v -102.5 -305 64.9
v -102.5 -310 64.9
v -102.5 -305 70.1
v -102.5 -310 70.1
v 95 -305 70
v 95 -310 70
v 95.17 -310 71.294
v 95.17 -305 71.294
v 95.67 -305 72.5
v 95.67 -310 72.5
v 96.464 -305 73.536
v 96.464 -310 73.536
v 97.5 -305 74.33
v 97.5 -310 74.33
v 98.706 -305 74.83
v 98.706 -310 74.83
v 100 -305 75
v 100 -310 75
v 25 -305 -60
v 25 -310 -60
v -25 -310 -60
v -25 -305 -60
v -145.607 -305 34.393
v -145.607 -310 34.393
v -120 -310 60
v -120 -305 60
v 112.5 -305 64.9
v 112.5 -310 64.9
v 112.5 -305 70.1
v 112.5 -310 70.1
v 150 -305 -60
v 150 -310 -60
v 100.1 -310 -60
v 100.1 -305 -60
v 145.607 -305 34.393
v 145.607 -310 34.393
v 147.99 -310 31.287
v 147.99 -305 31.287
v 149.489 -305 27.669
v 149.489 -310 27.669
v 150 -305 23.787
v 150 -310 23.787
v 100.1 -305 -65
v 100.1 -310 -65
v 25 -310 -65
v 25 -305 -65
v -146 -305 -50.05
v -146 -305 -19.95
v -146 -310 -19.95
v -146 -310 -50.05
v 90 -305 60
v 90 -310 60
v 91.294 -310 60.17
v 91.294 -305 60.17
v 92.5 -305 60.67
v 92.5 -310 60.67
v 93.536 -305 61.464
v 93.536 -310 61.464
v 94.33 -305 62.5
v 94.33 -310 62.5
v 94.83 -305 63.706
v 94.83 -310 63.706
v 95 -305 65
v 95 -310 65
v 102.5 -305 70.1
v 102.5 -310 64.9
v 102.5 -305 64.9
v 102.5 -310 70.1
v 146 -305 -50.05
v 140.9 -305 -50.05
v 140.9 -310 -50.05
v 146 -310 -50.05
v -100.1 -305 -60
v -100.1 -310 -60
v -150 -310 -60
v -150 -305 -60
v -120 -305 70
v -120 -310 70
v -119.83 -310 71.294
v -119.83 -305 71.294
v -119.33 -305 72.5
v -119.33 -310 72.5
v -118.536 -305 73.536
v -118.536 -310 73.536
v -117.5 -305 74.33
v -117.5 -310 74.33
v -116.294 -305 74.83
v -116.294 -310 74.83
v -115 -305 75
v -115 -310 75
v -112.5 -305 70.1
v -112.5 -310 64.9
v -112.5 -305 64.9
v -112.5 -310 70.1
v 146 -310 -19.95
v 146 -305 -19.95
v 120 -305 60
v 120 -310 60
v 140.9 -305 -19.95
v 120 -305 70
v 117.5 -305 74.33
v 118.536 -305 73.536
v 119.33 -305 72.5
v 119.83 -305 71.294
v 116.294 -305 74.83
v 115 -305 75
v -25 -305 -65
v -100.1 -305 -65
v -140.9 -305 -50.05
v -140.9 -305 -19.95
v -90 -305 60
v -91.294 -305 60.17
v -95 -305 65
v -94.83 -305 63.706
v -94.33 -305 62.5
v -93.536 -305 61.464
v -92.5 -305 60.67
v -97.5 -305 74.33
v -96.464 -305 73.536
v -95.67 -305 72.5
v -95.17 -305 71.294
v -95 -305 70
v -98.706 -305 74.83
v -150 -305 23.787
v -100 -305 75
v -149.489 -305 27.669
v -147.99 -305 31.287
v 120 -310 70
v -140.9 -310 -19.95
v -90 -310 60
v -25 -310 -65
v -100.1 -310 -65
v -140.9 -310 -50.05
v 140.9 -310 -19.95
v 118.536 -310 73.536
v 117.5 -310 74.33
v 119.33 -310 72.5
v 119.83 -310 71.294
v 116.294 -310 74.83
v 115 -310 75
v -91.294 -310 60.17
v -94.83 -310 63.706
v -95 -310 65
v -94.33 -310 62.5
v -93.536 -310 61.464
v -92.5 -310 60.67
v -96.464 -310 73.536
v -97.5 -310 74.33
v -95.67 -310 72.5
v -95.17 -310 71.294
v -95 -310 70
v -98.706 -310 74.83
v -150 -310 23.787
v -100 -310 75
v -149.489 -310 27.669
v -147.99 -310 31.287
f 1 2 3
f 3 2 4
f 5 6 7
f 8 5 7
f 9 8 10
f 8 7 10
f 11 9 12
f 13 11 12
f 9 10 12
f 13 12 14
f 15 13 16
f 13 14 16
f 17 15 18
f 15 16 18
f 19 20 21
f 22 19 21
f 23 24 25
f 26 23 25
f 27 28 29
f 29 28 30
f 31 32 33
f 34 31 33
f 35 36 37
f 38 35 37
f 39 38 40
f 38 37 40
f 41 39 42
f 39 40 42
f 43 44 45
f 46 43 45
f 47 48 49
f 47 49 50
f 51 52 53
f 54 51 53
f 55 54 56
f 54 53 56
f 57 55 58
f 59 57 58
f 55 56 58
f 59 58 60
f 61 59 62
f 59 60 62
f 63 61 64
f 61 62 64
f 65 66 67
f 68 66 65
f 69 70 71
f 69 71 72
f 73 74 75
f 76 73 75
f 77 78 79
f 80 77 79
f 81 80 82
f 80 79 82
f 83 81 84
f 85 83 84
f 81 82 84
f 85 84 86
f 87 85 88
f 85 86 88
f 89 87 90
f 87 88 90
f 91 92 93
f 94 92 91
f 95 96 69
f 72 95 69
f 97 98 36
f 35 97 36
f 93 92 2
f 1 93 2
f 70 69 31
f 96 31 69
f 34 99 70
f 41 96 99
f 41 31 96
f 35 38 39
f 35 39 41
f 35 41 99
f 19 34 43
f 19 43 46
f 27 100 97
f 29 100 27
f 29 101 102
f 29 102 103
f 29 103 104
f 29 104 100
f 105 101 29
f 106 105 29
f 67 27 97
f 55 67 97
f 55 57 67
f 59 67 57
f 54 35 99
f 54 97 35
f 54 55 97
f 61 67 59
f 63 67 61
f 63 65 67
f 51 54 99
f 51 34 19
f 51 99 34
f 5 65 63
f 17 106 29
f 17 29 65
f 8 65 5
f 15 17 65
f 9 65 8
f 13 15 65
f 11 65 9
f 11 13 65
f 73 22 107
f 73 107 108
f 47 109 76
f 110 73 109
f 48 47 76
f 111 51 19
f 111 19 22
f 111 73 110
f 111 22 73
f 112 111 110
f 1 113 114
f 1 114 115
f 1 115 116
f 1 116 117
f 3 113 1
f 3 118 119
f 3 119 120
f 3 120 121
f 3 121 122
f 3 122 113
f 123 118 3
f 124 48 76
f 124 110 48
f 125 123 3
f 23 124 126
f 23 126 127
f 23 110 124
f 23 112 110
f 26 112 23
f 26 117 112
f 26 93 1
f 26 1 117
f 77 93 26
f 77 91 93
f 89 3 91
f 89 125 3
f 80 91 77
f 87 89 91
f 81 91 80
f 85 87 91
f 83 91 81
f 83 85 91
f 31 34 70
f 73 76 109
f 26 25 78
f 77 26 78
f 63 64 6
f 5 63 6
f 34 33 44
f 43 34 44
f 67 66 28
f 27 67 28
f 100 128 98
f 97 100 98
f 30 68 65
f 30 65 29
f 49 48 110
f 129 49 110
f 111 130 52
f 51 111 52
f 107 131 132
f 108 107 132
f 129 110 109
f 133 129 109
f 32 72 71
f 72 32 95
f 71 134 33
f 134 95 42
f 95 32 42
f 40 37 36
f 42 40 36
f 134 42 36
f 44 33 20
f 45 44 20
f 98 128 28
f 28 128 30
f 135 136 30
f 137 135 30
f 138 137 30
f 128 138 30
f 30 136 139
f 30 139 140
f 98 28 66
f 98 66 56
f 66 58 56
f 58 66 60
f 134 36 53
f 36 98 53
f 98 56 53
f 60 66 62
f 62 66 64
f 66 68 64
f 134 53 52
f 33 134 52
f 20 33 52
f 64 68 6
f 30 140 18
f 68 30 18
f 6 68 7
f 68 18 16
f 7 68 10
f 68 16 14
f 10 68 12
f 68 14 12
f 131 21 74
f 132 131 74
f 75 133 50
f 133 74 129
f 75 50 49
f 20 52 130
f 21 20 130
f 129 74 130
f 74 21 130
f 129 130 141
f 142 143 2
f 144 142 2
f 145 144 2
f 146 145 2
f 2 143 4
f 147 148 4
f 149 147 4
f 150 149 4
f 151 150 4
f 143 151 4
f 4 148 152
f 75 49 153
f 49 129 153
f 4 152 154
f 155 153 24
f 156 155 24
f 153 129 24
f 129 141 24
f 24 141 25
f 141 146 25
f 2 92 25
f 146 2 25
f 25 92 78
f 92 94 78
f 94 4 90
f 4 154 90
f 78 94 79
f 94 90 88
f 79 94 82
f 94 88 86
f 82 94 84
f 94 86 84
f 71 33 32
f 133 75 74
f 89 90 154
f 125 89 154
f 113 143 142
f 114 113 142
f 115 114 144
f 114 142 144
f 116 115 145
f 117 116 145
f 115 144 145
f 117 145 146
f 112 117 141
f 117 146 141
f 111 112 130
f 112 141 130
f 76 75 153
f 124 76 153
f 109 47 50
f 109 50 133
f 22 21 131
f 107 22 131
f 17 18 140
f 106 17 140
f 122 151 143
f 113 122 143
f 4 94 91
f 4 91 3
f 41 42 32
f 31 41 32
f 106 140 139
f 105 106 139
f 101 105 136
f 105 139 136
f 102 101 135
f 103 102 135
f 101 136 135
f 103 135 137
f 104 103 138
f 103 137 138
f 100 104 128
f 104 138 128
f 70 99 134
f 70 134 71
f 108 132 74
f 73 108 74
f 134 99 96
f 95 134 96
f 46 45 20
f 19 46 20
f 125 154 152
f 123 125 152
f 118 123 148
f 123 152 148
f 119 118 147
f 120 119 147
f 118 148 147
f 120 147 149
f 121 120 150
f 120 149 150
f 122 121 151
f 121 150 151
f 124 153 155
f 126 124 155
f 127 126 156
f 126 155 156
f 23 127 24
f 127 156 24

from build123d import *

# Parameters (mm, degrees)
BODY_MOVE_COPY1_START         = -65
BODY_MOVE_COPY1_OUTLINE_W     = 5.1
BODY_MOVE_COPY1_OUTLINE_H     = 30.1
BODY_MOVE_COPY1_OUTLINE_R     = 2.6
BODY_MOVE_COPY1_OUTLINE_R_2   = 3.1
BODY_MOVE_COPY1_OUTLINE_R_3   = 1.55
BODY_MOVE_COPY1_OUTLINE_W_2   = 30.5
BODY_MOVE_COPY1_OUTLINE_H_2   = 14.5
BODY_MOVE_COPY1_DEPTH         = 5
BODY_MOVE_COPY1_START_2       = -5
BODY_MOVE_COPY1_2_OUTLINE_W   = 10
BODY_MOVE_COPY1_2_OUTLINE_H   = 5.2
BODY_MOVE_COPY1_2_OUTLINE_R   = 1.6
BODY_MOVE_COPY1_2_OUTLINE_W_2 = 5.1
BODY_MOVE_COPY1_2_OUTLINE_H_2 = 30.1
BODY_MOVE_COPY1_2_DEPTH       = 5
SKETCH26_W                    = 10
SKETCH26_H                    = 5.2
BOSS_EXTRUDE2_DEPTH           = 5
SKETCH28_W                    = 5.1
SKETCH28_H                    = 30.1
CUT_EXTRUDE1_DEPTH            = 349.066085679


# Read off the part's stored shape, not the designer's step: Body-Move/Copy1
with BuildPart() as part:
    # Body-Move/Copy1 outline → Body-Move/Copy1 (new body)
    with BuildSketch(Plane.XY.offset(BODY_MOVE_COPY1_START)):
        Polygon((24.9, -310), (24.9, -305), (100.2, -305), (100.2, -310), (150, -310), (150, -5), (10.65, -5), (10.65, 0), (-10.65, 0), (-10.65, -5), (-150, -5), (-150, -310), (-100.2, -310), (-100.2, -305), (-24.9, -305), (-24.9, -310), align=None)
        with Locations((-143.45, -280)):
            Rectangle(BODY_MOVE_COPY1_OUTLINE_W, BODY_MOVE_COPY1_OUTLINE_H, mode=Mode.SUBTRACT)
        with Locations((-90, -157.5)):
            Circle(BODY_MOVE_COPY1_OUTLINE_R, mode=Mode.SUBTRACT)
        with Locations((-60, -157.5)):
            Circle(BODY_MOVE_COPY1_OUTLINE_R, mode=Mode.SUBTRACT)
        with Locations((143.45, -280)):
            Rectangle(BODY_MOVE_COPY1_OUTLINE_W, BODY_MOVE_COPY1_OUTLINE_H, mode=Mode.SUBTRACT)
        with Locations((65, -157.5)):
            Circle(BODY_MOVE_COPY1_OUTLINE_R_2, mode=Mode.SUBTRACT)
        with Locations((85, -157.5)):
            Circle(BODY_MOVE_COPY1_OUTLINE_R_2, mode=Mode.SUBTRACT)
        with Locations((-90, -137.5)):
            Circle(BODY_MOVE_COPY1_OUTLINE_R_3, mode=Mode.SUBTRACT)
        with Locations((-60, -137.5)):
            Circle(BODY_MOVE_COPY1_OUTLINE_R_3, mode=Mode.SUBTRACT)
        with Locations((-75, -100.25)):
            Rectangle(BODY_MOVE_COPY1_OUTLINE_W_2, BODY_MOVE_COPY1_OUTLINE_H_2, mode=Mode.SUBTRACT)
        with Locations((-143.45, -30)):
            Rectangle(BODY_MOVE_COPY1_OUTLINE_W, BODY_MOVE_COPY1_OUTLINE_H, mode=Mode.SUBTRACT)
        with Locations((143.45, -30)):
            Rectangle(BODY_MOVE_COPY1_OUTLINE_W, BODY_MOVE_COPY1_OUTLINE_H, mode=Mode.SUBTRACT)
    extrude(amount=BODY_MOVE_COPY1_DEPTH)


with BuildPart() as body_2:
    # Body-Move_Copy1 2 outline → Body-Move_Copy1 2 (new body)
    with BuildSketch(Plane(origin=(0, 0, 0), x_dir=(1, 0, 0), z_dir=(0, 1, 0)).offset(BODY_MOVE_COPY1_START_2)):
        with BuildLine():
            ThreePointArc((-95, -65), (-93.535533906, -61.464466094), (-90, -60))
            Line((-90, -60), (90, -60))
            ThreePointArc((90, -60), (93.535533906, -61.464466094), (95, -65))
            Line((95, -65), (95, -70))
            ThreePointArc((95, -70), (96.464466094, -73.535533906), (100, -75))
            Line((100, -75), (115, -75))
            ThreePointArc((115, -75), (118.535533906, -73.535533906), (120, -70))
            Line((120, -70), (120, -60))
            Line((120, -60), (145.606601718, -34.393398282))
            ThreePointArc((145.606601718, -34.393398282), (148.858192988, -29.52704805), (150, -23.786796564))
            Line((150, -23.786796564), (150, 65))
            Line((150, 65), (10.75, 65))
            Line((10.75, 65), (10.75, 60))
            Line((10.75, 60), (-10.75, 60))
            Line((-10.75, 60), (-10.75, 65))
            Line((-10.75, 65), (-150, 65))
            Line((-150, 65), (-150, -23.786796564))
            ThreePointArc((-150, -23.786796564), (-148.858192988, -29.52704805), (-145.606601718, -34.393398282))
            Line((-145.606601718, -34.393398282), (-120, -60))
            Line((-120, -60), (-120, -70))
            ThreePointArc((-120, -70), (-118.535533906, -73.535533906), (-115, -75))
            Line((-115, -75), (-100, -75))
            ThreePointArc((-100, -75), (-96.464466094, -73.535533906), (-95, -70))
            Line((-95, -70), (-95, -65))
        make_face()
        with Locations((-107.5, -67.5)):
            Rectangle(BODY_MOVE_COPY1_2_OUTLINE_W, BODY_MOVE_COPY1_2_OUTLINE_H, mode=Mode.SUBTRACT)
        with Locations((-110, -52.5)):
            Circle(BODY_MOVE_COPY1_2_OUTLINE_R, mode=Mode.SUBTRACT)
        with Locations((-5, -52.5)):
            Circle(BODY_MOVE_COPY1_2_OUTLINE_R, mode=Mode.SUBTRACT)
        with Locations((5, -52.5)):
            Circle(BODY_MOVE_COPY1_2_OUTLINE_R, mode=Mode.SUBTRACT)
        with Locations((107.5, -67.5)):
            Rectangle(BODY_MOVE_COPY1_2_OUTLINE_W, BODY_MOVE_COPY1_2_OUTLINE_H, mode=Mode.SUBTRACT)
        with Locations((110, -52.5)):
            Circle(BODY_MOVE_COPY1_2_OUTLINE_R, mode=Mode.SUBTRACT)
        with Locations((-143.45, 35)):
            Rectangle(BODY_MOVE_COPY1_2_OUTLINE_W_2, BODY_MOVE_COPY1_2_OUTLINE_H_2, mode=Mode.SUBTRACT)
        with Locations((-110, 52.5)):
            Circle(BODY_MOVE_COPY1_2_OUTLINE_R, mode=Mode.SUBTRACT)
        with Locations((-5, 52.5)):
            Circle(BODY_MOVE_COPY1_2_OUTLINE_R, mode=Mode.SUBTRACT)
        with BuildLine():
            Line((131.606601718, -30.178932188), (115.267766953, -46.517766953))
            ThreePointArc((115.267766953, -46.517766953), (114.456708581, -47.059698831), (113.5, -47.25))
            Line((113.5, -47.25), (107.75, -47.25))
            ThreePointArc((107.75, -47.25), (105.982233047, -47.982233047), (105.25, -49.75))
            Line((105.25, -49.75), (105.25, -53.5))
            ThreePointArc((105.25, -53.5), (104.517766953, -55.267766953), (102.75, -56))
            Line((102.75, -56), (13.25, -56))
            ThreePointArc((13.25, -56), (11.482233047, -55.267766953), (10.75, -53.5))
            Line((10.75, -53.5), (10.75, -49.75))
            ThreePointArc((10.75, -49.75), (10.017766953, -47.982233047), (8.25, -47.25))
            Line((8.25, -47.25), (-8.25, -47.25))
            ThreePointArc((-8.25, -47.25), (-10.017766953, -47.982233047), (-10.75, -49.75))
            Line((-10.75, -49.75), (-10.75, -53.5))
            ThreePointArc((-10.75, -53.5), (-11.482233047, -55.267766953), (-13.25, -56))
            Line((-13.25, -56), (-102.75, -56))
            ThreePointArc((-102.75, -56), (-104.517766953, -55.267766953), (-105.25, -53.5))
            Line((-105.25, -53.5), (-105.25, -49.75))
            ThreePointArc((-105.25, -49.75), (-105.982233047, -47.982233047), (-107.75, -47.25))
            Line((-107.75, -47.25), (-113.5, -47.25))
            ThreePointArc((-113.5, -47.25), (-115.267766953, -46.517766953), (-116, -44.75))
            Line((-116, -44.75), (-116, 44.75))
            ThreePointArc((-116, 44.75), (-115.267766953, 46.517766953), (-113.5, 47.25))
            Line((-113.5, 47.25), (-107.75, 47.25))
            ThreePointArc((-107.75, 47.25), (-105.982233047, 47.982233047), (-105.25, 49.75))
            Line((-105.25, 49.75), (-105.25, 53.5))
            ThreePointArc((-105.25, 53.5), (-104.517766953, 55.267766953), (-102.75, 56))
            Line((-102.75, 56), (-13.25, 56))
            ThreePointArc((-13.25, 56), (-11.482233047, 55.267766953), (-10.75, 53.5))
            Line((-10.75, 53.5), (-10.75, 49.75))
            ThreePointArc((-10.75, 49.75), (-10.017766953, 47.982233047), (-8.25, 47.25))
            Line((-8.25, 47.25), (8.25, 47.25))
            ThreePointArc((8.25, 47.25), (10.017766953, 47.982233047), (10.75, 49.75))
            Line((10.75, 49.75), (10.75, 53.5))
            ThreePointArc((10.75, 53.5), (11.482233047, 55.267766953), (13.25, 56))
            Line((13.25, 56), (102.75, 56))
            ThreePointArc((102.75, 56), (104.517766953, 55.267766953), (105.25, 53.5))
            Line((105.25, 53.5), (105.25, 49.75))
            ThreePointArc((105.25, 49.75), (105.982233047, 47.982233047), (107.75, 47.25))
            Line((107.75, 47.25), (113.5, 47.25))
            ThreePointArc((113.5, 47.25), (115.267766953, 47.982233047), (116, 49.75))
            Line((116, 49.75), (116, 53.5))
            ThreePointArc((116, 53.5), (116.732233047, 55.267766953), (118.5, 56))
            Line((118.5, 56), (133.5, 56))
            ThreePointArc((133.5, 56), (135.267766953, 55.267766953), (136, 53.5))
            Line((136, 53.5), (136, -19.57233047))
            ThreePointArc((136, -19.57233047), (134.858192988, -25.312581956), (131.606601718, -30.178932188))
        make_face(mode=Mode.SUBTRACT)
        with Locations((5, 52.5)):
            Circle(BODY_MOVE_COPY1_2_OUTLINE_R, mode=Mode.SUBTRACT)
        with Locations((143.45, 35)):
            Rectangle(BODY_MOVE_COPY1_2_OUTLINE_W_2, BODY_MOVE_COPY1_2_OUTLINE_H_2, mode=Mode.SUBTRACT)
        with Locations((110, 52.5)):
            Circle(BODY_MOVE_COPY1_2_OUTLINE_R, mode=Mode.SUBTRACT)
    extrude(amount=BODY_MOVE_COPY1_2_DEPTH)


with BuildPart() as body_3:
    # Sketch26 → Boss-Extrude2 (new body)
    with BuildSketch(Plane.XZ.offset(310)):
        with BuildLine():
            Line((-90, 60), (90, 60))
            ThreePointArc((90, 60), (93.535533906, 61.464466094), (95, 65))
            Line((95, 65), (95, 70))
            ThreePointArc((95, 70), (96.464466094, 73.535533906), (100, 75))
            Line((100, 75), (115, 75))
            ThreePointArc((115, 75), (118.535533906, 73.535533906), (120, 70))
            Line((120, 70), (120, 60))
            Line((120, 60), (145.606601718, 34.393398282))
            ThreePointArc((145.606601718, 34.393398282), (148.858192988, 29.52704805), (150, 23.786796564))
            Line((150, 23.786796564), (150, -60))
            Line((150, -60), (100.1, -60))
            Line((100.1, -60), (100.1, -65))
            Line((100.1, -65), (25, -65))
            Line((25, -65), (25, -60))
            Line((25, -60), (-25, -60))
            Line((-25, -60), (-25, -65))
            Line((-25, -65), (-100.1, -65))
            Line((-100.1, -65), (-100.1, -60))
            Line((-100.1, -60), (-150, -60))
            Line((-150, -60), (-150, 23.786796564))
            ThreePointArc((-150, 23.786796564), (-148.858192988, 29.52704805), (-145.606601718, 34.393398282))
            Line((-145.606601718, 34.393398282), (-120, 60))
            Line((-120, 60), (-120, 70))
            ThreePointArc((-120, 70), (-118.535533906, 73.535533906), (-115, 75))
            Line((-115, 75), (-100, 75))
            ThreePointArc((-100, 75), (-96.464466094, 73.535533906), (-95, 70))
            Line((-95, 70), (-95, 65))
            ThreePointArc((-95, 65), (-93.535533906, 61.464466094), (-90, 60))
        make_face()
        with Locations((107.5, 67.5)):
            Rectangle(SKETCH26_W, SKETCH26_H, mode=Mode.SUBTRACT)
        with Locations((-107.5, 67.5)):
            Rectangle(SKETCH26_W, SKETCH26_H, mode=Mode.SUBTRACT)
    extrude(amount=-BOSS_EXTRUDE2_DEPTH)

    # Sketch28 → Cut-Extrude1 (cut, through all)
    with BuildSketch(Plane(origin=(0, -305, 0), x_dir=(1, 0, 0), z_dir=(0, 1, 0))):
        with Locations((143.45, 35)):
            Rectangle(SKETCH28_W, SKETCH28_H)
        with Locations((-143.45, 35)):
            Rectangle(SKETCH28_W, SKETCH28_H)
    extrude(amount=-CUT_EXTRUDE1_DEPTH, mode=Mode.SUBTRACT)


solid = body_3.part
